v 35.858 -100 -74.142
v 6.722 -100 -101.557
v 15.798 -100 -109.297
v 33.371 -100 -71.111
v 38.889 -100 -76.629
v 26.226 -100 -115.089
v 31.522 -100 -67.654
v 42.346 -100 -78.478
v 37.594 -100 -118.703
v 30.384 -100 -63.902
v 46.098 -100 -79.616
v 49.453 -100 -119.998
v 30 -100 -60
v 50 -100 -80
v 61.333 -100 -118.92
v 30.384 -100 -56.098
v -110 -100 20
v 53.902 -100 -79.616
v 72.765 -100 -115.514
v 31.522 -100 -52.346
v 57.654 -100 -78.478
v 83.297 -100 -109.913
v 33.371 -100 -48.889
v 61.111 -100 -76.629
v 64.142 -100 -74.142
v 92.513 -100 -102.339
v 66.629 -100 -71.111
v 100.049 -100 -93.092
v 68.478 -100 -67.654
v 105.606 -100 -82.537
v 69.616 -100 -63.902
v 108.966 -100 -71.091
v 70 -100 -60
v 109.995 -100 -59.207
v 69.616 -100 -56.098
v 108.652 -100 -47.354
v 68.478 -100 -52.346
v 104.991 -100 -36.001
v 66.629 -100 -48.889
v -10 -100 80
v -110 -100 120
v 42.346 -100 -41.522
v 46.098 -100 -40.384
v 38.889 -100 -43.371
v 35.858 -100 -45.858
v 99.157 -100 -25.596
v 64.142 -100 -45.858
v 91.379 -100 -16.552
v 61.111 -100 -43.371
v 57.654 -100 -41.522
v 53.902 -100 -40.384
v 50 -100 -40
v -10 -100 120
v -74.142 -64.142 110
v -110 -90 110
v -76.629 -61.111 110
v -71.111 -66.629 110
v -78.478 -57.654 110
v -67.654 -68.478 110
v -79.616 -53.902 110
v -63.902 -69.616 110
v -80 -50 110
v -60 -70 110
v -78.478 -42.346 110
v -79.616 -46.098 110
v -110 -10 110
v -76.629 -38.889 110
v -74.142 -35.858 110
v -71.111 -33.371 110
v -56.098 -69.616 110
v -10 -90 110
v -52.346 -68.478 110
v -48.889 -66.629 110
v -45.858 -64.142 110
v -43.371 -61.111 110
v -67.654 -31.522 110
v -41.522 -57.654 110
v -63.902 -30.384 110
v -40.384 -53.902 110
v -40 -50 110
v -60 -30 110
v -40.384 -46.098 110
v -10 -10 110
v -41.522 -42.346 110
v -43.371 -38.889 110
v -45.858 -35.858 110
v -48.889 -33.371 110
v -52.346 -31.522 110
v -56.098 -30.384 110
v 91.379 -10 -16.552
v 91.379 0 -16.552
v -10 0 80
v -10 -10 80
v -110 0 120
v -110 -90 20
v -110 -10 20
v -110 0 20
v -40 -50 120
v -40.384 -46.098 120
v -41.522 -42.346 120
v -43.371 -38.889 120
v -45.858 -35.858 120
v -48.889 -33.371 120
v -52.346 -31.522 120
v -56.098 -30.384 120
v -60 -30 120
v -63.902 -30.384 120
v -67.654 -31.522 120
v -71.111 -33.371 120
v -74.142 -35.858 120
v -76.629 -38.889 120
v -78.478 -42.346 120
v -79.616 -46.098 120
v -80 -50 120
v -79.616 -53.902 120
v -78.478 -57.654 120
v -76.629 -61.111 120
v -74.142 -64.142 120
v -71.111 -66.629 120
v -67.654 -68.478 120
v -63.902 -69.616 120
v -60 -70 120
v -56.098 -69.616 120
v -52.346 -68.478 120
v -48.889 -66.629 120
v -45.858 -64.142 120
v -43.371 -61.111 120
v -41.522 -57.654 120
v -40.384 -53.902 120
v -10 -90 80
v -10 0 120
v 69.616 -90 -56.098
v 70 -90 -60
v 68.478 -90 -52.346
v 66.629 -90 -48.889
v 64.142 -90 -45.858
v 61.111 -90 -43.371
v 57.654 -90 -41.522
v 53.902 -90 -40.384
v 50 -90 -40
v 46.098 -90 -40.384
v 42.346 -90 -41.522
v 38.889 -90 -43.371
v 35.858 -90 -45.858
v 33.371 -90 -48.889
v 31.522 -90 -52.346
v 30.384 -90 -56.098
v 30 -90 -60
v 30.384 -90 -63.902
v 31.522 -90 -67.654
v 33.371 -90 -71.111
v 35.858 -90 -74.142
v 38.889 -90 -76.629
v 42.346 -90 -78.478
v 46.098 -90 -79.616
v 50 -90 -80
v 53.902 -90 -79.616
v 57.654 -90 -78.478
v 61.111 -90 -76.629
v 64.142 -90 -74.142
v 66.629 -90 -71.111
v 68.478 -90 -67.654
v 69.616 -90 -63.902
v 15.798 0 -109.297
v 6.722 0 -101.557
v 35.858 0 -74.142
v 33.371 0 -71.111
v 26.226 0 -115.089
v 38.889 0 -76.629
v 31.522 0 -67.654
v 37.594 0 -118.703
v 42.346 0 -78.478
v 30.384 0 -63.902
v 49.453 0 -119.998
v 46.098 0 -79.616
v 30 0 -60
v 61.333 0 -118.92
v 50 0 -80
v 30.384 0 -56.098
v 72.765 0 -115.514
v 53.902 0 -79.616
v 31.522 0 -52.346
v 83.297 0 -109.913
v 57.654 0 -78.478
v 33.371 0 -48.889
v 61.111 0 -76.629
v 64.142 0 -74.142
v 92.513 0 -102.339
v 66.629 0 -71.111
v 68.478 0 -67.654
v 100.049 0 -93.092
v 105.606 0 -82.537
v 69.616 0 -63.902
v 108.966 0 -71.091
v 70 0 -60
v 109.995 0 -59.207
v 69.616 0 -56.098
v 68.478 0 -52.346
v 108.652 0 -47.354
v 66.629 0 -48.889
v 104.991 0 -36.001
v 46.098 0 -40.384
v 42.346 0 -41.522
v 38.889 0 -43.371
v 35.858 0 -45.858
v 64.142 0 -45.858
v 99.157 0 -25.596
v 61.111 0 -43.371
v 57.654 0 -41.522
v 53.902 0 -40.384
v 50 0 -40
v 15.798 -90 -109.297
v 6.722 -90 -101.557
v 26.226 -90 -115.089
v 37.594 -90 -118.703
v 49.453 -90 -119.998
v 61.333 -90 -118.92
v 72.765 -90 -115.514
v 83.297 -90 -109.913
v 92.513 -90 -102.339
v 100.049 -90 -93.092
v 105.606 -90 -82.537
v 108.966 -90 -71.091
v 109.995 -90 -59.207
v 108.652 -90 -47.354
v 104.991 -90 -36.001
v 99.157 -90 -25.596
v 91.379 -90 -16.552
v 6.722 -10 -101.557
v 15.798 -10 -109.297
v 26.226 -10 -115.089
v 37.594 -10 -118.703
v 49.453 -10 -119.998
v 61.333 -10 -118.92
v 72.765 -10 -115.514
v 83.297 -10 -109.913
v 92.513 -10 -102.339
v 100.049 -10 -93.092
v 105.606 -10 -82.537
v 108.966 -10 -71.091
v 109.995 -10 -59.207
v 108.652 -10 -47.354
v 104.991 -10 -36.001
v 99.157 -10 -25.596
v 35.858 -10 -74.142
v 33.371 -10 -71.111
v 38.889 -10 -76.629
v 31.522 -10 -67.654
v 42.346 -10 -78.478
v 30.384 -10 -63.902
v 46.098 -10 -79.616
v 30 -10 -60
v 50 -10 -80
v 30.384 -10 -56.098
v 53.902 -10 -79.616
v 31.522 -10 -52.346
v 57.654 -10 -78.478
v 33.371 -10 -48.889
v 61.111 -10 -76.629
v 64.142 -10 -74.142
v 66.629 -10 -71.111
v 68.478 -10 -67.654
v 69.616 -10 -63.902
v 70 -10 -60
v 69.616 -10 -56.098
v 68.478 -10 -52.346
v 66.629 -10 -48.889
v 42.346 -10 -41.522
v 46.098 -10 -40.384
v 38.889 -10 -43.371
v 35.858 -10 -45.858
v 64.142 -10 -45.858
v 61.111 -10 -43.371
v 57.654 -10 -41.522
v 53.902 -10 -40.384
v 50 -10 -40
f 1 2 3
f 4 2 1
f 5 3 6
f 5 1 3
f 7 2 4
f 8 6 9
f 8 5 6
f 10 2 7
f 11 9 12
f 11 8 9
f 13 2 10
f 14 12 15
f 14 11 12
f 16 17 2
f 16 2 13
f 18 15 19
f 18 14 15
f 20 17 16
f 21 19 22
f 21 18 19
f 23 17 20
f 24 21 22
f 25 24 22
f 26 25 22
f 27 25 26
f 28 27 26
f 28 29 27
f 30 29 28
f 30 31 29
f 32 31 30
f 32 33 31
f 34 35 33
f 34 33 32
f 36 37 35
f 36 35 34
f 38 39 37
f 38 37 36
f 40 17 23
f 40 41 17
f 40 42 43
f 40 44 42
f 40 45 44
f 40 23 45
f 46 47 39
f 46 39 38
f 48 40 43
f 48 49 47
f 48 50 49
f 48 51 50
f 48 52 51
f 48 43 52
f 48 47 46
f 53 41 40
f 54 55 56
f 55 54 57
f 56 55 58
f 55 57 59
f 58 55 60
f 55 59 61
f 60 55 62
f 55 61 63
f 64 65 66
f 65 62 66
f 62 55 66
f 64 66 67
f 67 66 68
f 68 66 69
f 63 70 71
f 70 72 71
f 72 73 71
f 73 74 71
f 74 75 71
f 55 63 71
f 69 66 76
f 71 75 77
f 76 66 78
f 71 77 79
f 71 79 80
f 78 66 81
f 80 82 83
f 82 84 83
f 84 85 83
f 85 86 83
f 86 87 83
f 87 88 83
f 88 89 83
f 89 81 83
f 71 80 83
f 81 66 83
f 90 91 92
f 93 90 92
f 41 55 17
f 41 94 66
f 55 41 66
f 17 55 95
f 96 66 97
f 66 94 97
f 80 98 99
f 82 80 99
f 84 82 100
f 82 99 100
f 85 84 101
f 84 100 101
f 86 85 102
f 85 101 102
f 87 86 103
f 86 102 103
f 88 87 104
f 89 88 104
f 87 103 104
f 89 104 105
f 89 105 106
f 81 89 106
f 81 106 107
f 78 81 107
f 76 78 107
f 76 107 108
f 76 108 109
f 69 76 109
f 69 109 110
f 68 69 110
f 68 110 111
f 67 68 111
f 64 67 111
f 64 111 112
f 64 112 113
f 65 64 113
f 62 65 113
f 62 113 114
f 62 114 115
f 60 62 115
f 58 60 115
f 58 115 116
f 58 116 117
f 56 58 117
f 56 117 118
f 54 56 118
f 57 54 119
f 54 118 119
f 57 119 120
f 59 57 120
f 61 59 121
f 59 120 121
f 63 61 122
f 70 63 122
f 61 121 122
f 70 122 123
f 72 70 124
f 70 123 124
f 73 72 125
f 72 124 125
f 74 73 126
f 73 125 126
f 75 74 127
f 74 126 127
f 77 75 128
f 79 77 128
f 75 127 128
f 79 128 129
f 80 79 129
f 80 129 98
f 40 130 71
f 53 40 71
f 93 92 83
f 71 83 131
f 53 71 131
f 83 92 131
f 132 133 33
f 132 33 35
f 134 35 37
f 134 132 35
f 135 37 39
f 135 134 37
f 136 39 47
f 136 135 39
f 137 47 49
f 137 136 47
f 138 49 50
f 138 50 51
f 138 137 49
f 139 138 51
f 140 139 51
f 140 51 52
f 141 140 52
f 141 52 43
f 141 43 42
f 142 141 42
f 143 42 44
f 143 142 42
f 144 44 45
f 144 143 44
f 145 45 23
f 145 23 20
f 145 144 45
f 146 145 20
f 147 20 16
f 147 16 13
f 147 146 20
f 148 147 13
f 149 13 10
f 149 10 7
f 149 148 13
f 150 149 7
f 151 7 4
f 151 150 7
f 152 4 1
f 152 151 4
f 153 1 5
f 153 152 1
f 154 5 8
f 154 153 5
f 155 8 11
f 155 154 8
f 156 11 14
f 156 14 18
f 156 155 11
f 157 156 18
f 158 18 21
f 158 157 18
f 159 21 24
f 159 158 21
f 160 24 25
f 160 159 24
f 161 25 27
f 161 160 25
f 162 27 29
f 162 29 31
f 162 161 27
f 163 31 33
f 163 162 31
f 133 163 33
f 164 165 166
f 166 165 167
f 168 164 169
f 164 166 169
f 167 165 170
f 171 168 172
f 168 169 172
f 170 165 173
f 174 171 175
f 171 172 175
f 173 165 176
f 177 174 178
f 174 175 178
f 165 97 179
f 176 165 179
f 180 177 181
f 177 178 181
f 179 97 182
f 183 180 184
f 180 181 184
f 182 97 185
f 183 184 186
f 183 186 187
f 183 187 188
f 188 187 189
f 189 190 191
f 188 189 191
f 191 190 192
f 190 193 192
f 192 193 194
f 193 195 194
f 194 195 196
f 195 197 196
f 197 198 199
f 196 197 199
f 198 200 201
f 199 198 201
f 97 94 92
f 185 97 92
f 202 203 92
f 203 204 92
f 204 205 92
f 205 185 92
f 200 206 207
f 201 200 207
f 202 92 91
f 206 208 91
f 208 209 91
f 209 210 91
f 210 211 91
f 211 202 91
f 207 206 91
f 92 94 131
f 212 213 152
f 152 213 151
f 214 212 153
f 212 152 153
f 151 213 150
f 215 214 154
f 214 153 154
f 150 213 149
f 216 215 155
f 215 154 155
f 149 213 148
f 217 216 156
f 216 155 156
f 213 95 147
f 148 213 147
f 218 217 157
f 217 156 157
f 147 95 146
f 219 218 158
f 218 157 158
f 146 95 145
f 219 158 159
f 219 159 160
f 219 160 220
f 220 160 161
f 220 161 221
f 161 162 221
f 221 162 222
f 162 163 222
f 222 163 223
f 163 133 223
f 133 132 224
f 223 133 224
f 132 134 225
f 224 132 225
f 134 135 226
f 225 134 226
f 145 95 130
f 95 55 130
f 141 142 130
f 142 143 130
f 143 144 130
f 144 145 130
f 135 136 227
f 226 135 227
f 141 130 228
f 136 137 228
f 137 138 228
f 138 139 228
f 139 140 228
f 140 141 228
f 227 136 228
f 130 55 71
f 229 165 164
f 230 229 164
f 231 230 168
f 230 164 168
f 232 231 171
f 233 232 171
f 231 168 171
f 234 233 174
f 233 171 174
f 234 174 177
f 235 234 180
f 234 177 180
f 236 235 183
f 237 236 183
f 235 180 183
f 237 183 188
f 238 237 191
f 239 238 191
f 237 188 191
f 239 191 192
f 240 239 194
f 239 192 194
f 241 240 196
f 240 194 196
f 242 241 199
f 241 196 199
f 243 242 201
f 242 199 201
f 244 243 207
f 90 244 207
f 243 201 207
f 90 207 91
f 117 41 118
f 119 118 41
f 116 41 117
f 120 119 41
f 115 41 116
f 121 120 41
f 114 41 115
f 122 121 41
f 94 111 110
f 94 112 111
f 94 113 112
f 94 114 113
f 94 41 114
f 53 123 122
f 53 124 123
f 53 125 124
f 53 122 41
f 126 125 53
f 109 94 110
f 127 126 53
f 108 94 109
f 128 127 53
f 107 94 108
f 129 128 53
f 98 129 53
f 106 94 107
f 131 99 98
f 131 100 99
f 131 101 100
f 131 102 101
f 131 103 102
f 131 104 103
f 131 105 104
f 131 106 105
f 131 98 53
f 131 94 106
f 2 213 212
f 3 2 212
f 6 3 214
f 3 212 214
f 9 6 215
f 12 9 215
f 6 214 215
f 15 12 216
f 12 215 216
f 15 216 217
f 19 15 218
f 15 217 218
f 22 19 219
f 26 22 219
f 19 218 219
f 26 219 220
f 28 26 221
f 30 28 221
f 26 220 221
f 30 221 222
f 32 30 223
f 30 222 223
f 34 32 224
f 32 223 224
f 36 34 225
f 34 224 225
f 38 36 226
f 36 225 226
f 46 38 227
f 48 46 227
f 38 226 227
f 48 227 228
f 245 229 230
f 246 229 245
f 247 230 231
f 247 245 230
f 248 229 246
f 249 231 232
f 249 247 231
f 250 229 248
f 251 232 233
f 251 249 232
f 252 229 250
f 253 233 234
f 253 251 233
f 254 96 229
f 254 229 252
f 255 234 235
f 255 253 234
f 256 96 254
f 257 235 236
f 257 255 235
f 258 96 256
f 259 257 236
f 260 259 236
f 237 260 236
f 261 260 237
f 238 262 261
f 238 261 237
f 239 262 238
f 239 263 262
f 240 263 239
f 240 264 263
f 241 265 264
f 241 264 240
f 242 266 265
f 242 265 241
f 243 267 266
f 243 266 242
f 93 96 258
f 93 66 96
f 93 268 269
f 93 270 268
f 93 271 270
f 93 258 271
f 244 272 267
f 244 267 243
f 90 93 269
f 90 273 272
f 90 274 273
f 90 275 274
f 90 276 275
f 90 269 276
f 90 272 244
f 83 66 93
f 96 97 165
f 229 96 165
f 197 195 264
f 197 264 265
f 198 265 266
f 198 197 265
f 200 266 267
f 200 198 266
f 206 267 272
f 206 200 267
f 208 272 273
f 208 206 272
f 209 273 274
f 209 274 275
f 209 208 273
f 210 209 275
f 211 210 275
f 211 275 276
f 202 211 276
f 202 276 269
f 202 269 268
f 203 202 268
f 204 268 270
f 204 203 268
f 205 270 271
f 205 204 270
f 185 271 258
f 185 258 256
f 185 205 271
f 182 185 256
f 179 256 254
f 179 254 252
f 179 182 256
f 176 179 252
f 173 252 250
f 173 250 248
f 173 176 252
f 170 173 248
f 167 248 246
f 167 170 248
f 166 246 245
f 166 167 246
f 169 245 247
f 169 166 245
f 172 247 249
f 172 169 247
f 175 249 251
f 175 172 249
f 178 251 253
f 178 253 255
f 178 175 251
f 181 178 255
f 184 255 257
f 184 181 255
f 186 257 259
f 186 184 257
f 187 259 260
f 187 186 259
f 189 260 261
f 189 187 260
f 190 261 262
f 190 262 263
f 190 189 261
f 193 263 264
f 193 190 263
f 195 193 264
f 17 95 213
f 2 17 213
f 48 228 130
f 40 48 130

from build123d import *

# Parameters (mm, degrees)
F0_R     = 20
F1_DEPTH = 10
F2_W     = 100
F2_H     = 10
F3_DEPTH = 80
F4_R     = 20
F4_W     = 100
F4_H     = 10
F5_DEPTH = 10
F6_R     = 20
F7_DEPTH = 25


with BuildPart() as f1:
    # F0 (on Front) → F1 (new body)
    with BuildSketch(Plane.XZ):
        with BuildLine():
            Line((-10, 120), (-110, 120))
            Line((-110, 120), (-110, 20))
            Line((-110, 20), (6.721551, -101.556899))
            ThreePointArc((6.721551, -101.556899), (92.513193, -102.339443), (91.37931, -16.551724))
            Line((91.37931, -16.551724), (-10, 80))
            Line((-10, 80), (-10, 120))
        make_face()
        with Locations((50, -60)):
            Circle(F0_R, mode=Mode.SUBTRACT)
    extrude(amount=F1_DEPTH)

    # F2 (on face) → F3 (join)
    with BuildSketch(Plane.XZ.offset(10)):
        with Locations((-60, 115)):
            Rectangle(F2_W, F2_H)
    extrude(amount=F3_DEPTH)

    # F4 (on face) → F5 (join)
    with BuildSketch(Plane.XZ.offset(90)):
        with BuildLine():
            Line((-10, 110), (-110, 110))
            Line((-110, 110), (-110, 20))
            Line((-110, 20), (6.721551, -101.556899))
            ThreePointArc((6.721551, -101.556899), (92.513193, -102.339443), (91.37931, -16.551724))
            Line((91.37931, -16.551724), (-10, 80))
            Line((-10, 80), (-10, 110))
        make_face()
        with Locations((50, -60)):
            Circle(F4_R, mode=Mode.SUBTRACT)
        with Locations((-60, 115)):
            Rectangle(F4_W, F4_H)
    extrude(amount=F5_DEPTH)

    # F6 (on face) → F7 (cut)
    with BuildSketch(Plane.XY.offset(120)):
        with Locations((-60, -50)):
            Circle(F6_R)
    extrude(amount=-F7_DEPTH, mode=Mode.SUBTRACT)


solid = f1.part
